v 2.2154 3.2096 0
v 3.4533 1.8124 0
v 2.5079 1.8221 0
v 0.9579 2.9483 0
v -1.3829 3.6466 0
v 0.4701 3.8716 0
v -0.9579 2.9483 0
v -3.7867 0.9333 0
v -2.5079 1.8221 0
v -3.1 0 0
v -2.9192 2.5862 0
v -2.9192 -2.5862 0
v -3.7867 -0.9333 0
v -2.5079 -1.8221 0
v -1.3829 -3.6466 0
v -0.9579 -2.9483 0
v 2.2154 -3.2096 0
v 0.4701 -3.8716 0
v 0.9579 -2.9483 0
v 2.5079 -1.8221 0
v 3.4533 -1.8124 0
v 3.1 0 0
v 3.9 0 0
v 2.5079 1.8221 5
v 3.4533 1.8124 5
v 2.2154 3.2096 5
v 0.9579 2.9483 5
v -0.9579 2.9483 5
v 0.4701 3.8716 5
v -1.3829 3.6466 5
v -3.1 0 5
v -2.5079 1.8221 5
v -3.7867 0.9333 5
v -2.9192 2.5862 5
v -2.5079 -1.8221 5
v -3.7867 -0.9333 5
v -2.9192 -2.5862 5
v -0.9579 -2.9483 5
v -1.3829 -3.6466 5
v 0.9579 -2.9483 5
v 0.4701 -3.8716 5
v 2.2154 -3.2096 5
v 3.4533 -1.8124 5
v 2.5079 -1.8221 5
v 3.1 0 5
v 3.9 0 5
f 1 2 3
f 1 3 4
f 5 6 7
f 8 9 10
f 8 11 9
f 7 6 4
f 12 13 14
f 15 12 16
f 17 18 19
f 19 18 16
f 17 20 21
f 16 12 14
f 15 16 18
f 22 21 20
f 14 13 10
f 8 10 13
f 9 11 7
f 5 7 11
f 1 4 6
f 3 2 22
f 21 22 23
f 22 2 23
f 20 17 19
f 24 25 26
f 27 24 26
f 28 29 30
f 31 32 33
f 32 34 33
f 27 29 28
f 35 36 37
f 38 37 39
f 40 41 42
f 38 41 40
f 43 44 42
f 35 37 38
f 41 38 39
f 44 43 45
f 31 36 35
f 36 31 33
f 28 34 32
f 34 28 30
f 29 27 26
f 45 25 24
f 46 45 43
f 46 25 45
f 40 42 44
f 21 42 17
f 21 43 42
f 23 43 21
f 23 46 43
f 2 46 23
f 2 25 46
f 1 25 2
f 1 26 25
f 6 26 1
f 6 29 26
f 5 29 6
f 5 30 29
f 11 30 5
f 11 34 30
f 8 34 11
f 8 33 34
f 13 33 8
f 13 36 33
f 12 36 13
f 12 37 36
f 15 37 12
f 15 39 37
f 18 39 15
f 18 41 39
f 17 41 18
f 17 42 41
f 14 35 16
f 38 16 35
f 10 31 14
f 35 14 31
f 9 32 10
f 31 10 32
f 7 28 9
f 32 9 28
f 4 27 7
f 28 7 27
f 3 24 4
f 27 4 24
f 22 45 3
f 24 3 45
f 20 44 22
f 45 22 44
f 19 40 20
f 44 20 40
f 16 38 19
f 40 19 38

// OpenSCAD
module ring(inner_d, outer_d, height) {
    inner_r = inner_d / 2;
    outer_r = outer_d / 2;
    linear_extrude(height)
        difference() {
            circle(outer_r);
            circle(inner_r);
        }
}

ring(inner_d=6.2, outer_d=7.8, height=5);
